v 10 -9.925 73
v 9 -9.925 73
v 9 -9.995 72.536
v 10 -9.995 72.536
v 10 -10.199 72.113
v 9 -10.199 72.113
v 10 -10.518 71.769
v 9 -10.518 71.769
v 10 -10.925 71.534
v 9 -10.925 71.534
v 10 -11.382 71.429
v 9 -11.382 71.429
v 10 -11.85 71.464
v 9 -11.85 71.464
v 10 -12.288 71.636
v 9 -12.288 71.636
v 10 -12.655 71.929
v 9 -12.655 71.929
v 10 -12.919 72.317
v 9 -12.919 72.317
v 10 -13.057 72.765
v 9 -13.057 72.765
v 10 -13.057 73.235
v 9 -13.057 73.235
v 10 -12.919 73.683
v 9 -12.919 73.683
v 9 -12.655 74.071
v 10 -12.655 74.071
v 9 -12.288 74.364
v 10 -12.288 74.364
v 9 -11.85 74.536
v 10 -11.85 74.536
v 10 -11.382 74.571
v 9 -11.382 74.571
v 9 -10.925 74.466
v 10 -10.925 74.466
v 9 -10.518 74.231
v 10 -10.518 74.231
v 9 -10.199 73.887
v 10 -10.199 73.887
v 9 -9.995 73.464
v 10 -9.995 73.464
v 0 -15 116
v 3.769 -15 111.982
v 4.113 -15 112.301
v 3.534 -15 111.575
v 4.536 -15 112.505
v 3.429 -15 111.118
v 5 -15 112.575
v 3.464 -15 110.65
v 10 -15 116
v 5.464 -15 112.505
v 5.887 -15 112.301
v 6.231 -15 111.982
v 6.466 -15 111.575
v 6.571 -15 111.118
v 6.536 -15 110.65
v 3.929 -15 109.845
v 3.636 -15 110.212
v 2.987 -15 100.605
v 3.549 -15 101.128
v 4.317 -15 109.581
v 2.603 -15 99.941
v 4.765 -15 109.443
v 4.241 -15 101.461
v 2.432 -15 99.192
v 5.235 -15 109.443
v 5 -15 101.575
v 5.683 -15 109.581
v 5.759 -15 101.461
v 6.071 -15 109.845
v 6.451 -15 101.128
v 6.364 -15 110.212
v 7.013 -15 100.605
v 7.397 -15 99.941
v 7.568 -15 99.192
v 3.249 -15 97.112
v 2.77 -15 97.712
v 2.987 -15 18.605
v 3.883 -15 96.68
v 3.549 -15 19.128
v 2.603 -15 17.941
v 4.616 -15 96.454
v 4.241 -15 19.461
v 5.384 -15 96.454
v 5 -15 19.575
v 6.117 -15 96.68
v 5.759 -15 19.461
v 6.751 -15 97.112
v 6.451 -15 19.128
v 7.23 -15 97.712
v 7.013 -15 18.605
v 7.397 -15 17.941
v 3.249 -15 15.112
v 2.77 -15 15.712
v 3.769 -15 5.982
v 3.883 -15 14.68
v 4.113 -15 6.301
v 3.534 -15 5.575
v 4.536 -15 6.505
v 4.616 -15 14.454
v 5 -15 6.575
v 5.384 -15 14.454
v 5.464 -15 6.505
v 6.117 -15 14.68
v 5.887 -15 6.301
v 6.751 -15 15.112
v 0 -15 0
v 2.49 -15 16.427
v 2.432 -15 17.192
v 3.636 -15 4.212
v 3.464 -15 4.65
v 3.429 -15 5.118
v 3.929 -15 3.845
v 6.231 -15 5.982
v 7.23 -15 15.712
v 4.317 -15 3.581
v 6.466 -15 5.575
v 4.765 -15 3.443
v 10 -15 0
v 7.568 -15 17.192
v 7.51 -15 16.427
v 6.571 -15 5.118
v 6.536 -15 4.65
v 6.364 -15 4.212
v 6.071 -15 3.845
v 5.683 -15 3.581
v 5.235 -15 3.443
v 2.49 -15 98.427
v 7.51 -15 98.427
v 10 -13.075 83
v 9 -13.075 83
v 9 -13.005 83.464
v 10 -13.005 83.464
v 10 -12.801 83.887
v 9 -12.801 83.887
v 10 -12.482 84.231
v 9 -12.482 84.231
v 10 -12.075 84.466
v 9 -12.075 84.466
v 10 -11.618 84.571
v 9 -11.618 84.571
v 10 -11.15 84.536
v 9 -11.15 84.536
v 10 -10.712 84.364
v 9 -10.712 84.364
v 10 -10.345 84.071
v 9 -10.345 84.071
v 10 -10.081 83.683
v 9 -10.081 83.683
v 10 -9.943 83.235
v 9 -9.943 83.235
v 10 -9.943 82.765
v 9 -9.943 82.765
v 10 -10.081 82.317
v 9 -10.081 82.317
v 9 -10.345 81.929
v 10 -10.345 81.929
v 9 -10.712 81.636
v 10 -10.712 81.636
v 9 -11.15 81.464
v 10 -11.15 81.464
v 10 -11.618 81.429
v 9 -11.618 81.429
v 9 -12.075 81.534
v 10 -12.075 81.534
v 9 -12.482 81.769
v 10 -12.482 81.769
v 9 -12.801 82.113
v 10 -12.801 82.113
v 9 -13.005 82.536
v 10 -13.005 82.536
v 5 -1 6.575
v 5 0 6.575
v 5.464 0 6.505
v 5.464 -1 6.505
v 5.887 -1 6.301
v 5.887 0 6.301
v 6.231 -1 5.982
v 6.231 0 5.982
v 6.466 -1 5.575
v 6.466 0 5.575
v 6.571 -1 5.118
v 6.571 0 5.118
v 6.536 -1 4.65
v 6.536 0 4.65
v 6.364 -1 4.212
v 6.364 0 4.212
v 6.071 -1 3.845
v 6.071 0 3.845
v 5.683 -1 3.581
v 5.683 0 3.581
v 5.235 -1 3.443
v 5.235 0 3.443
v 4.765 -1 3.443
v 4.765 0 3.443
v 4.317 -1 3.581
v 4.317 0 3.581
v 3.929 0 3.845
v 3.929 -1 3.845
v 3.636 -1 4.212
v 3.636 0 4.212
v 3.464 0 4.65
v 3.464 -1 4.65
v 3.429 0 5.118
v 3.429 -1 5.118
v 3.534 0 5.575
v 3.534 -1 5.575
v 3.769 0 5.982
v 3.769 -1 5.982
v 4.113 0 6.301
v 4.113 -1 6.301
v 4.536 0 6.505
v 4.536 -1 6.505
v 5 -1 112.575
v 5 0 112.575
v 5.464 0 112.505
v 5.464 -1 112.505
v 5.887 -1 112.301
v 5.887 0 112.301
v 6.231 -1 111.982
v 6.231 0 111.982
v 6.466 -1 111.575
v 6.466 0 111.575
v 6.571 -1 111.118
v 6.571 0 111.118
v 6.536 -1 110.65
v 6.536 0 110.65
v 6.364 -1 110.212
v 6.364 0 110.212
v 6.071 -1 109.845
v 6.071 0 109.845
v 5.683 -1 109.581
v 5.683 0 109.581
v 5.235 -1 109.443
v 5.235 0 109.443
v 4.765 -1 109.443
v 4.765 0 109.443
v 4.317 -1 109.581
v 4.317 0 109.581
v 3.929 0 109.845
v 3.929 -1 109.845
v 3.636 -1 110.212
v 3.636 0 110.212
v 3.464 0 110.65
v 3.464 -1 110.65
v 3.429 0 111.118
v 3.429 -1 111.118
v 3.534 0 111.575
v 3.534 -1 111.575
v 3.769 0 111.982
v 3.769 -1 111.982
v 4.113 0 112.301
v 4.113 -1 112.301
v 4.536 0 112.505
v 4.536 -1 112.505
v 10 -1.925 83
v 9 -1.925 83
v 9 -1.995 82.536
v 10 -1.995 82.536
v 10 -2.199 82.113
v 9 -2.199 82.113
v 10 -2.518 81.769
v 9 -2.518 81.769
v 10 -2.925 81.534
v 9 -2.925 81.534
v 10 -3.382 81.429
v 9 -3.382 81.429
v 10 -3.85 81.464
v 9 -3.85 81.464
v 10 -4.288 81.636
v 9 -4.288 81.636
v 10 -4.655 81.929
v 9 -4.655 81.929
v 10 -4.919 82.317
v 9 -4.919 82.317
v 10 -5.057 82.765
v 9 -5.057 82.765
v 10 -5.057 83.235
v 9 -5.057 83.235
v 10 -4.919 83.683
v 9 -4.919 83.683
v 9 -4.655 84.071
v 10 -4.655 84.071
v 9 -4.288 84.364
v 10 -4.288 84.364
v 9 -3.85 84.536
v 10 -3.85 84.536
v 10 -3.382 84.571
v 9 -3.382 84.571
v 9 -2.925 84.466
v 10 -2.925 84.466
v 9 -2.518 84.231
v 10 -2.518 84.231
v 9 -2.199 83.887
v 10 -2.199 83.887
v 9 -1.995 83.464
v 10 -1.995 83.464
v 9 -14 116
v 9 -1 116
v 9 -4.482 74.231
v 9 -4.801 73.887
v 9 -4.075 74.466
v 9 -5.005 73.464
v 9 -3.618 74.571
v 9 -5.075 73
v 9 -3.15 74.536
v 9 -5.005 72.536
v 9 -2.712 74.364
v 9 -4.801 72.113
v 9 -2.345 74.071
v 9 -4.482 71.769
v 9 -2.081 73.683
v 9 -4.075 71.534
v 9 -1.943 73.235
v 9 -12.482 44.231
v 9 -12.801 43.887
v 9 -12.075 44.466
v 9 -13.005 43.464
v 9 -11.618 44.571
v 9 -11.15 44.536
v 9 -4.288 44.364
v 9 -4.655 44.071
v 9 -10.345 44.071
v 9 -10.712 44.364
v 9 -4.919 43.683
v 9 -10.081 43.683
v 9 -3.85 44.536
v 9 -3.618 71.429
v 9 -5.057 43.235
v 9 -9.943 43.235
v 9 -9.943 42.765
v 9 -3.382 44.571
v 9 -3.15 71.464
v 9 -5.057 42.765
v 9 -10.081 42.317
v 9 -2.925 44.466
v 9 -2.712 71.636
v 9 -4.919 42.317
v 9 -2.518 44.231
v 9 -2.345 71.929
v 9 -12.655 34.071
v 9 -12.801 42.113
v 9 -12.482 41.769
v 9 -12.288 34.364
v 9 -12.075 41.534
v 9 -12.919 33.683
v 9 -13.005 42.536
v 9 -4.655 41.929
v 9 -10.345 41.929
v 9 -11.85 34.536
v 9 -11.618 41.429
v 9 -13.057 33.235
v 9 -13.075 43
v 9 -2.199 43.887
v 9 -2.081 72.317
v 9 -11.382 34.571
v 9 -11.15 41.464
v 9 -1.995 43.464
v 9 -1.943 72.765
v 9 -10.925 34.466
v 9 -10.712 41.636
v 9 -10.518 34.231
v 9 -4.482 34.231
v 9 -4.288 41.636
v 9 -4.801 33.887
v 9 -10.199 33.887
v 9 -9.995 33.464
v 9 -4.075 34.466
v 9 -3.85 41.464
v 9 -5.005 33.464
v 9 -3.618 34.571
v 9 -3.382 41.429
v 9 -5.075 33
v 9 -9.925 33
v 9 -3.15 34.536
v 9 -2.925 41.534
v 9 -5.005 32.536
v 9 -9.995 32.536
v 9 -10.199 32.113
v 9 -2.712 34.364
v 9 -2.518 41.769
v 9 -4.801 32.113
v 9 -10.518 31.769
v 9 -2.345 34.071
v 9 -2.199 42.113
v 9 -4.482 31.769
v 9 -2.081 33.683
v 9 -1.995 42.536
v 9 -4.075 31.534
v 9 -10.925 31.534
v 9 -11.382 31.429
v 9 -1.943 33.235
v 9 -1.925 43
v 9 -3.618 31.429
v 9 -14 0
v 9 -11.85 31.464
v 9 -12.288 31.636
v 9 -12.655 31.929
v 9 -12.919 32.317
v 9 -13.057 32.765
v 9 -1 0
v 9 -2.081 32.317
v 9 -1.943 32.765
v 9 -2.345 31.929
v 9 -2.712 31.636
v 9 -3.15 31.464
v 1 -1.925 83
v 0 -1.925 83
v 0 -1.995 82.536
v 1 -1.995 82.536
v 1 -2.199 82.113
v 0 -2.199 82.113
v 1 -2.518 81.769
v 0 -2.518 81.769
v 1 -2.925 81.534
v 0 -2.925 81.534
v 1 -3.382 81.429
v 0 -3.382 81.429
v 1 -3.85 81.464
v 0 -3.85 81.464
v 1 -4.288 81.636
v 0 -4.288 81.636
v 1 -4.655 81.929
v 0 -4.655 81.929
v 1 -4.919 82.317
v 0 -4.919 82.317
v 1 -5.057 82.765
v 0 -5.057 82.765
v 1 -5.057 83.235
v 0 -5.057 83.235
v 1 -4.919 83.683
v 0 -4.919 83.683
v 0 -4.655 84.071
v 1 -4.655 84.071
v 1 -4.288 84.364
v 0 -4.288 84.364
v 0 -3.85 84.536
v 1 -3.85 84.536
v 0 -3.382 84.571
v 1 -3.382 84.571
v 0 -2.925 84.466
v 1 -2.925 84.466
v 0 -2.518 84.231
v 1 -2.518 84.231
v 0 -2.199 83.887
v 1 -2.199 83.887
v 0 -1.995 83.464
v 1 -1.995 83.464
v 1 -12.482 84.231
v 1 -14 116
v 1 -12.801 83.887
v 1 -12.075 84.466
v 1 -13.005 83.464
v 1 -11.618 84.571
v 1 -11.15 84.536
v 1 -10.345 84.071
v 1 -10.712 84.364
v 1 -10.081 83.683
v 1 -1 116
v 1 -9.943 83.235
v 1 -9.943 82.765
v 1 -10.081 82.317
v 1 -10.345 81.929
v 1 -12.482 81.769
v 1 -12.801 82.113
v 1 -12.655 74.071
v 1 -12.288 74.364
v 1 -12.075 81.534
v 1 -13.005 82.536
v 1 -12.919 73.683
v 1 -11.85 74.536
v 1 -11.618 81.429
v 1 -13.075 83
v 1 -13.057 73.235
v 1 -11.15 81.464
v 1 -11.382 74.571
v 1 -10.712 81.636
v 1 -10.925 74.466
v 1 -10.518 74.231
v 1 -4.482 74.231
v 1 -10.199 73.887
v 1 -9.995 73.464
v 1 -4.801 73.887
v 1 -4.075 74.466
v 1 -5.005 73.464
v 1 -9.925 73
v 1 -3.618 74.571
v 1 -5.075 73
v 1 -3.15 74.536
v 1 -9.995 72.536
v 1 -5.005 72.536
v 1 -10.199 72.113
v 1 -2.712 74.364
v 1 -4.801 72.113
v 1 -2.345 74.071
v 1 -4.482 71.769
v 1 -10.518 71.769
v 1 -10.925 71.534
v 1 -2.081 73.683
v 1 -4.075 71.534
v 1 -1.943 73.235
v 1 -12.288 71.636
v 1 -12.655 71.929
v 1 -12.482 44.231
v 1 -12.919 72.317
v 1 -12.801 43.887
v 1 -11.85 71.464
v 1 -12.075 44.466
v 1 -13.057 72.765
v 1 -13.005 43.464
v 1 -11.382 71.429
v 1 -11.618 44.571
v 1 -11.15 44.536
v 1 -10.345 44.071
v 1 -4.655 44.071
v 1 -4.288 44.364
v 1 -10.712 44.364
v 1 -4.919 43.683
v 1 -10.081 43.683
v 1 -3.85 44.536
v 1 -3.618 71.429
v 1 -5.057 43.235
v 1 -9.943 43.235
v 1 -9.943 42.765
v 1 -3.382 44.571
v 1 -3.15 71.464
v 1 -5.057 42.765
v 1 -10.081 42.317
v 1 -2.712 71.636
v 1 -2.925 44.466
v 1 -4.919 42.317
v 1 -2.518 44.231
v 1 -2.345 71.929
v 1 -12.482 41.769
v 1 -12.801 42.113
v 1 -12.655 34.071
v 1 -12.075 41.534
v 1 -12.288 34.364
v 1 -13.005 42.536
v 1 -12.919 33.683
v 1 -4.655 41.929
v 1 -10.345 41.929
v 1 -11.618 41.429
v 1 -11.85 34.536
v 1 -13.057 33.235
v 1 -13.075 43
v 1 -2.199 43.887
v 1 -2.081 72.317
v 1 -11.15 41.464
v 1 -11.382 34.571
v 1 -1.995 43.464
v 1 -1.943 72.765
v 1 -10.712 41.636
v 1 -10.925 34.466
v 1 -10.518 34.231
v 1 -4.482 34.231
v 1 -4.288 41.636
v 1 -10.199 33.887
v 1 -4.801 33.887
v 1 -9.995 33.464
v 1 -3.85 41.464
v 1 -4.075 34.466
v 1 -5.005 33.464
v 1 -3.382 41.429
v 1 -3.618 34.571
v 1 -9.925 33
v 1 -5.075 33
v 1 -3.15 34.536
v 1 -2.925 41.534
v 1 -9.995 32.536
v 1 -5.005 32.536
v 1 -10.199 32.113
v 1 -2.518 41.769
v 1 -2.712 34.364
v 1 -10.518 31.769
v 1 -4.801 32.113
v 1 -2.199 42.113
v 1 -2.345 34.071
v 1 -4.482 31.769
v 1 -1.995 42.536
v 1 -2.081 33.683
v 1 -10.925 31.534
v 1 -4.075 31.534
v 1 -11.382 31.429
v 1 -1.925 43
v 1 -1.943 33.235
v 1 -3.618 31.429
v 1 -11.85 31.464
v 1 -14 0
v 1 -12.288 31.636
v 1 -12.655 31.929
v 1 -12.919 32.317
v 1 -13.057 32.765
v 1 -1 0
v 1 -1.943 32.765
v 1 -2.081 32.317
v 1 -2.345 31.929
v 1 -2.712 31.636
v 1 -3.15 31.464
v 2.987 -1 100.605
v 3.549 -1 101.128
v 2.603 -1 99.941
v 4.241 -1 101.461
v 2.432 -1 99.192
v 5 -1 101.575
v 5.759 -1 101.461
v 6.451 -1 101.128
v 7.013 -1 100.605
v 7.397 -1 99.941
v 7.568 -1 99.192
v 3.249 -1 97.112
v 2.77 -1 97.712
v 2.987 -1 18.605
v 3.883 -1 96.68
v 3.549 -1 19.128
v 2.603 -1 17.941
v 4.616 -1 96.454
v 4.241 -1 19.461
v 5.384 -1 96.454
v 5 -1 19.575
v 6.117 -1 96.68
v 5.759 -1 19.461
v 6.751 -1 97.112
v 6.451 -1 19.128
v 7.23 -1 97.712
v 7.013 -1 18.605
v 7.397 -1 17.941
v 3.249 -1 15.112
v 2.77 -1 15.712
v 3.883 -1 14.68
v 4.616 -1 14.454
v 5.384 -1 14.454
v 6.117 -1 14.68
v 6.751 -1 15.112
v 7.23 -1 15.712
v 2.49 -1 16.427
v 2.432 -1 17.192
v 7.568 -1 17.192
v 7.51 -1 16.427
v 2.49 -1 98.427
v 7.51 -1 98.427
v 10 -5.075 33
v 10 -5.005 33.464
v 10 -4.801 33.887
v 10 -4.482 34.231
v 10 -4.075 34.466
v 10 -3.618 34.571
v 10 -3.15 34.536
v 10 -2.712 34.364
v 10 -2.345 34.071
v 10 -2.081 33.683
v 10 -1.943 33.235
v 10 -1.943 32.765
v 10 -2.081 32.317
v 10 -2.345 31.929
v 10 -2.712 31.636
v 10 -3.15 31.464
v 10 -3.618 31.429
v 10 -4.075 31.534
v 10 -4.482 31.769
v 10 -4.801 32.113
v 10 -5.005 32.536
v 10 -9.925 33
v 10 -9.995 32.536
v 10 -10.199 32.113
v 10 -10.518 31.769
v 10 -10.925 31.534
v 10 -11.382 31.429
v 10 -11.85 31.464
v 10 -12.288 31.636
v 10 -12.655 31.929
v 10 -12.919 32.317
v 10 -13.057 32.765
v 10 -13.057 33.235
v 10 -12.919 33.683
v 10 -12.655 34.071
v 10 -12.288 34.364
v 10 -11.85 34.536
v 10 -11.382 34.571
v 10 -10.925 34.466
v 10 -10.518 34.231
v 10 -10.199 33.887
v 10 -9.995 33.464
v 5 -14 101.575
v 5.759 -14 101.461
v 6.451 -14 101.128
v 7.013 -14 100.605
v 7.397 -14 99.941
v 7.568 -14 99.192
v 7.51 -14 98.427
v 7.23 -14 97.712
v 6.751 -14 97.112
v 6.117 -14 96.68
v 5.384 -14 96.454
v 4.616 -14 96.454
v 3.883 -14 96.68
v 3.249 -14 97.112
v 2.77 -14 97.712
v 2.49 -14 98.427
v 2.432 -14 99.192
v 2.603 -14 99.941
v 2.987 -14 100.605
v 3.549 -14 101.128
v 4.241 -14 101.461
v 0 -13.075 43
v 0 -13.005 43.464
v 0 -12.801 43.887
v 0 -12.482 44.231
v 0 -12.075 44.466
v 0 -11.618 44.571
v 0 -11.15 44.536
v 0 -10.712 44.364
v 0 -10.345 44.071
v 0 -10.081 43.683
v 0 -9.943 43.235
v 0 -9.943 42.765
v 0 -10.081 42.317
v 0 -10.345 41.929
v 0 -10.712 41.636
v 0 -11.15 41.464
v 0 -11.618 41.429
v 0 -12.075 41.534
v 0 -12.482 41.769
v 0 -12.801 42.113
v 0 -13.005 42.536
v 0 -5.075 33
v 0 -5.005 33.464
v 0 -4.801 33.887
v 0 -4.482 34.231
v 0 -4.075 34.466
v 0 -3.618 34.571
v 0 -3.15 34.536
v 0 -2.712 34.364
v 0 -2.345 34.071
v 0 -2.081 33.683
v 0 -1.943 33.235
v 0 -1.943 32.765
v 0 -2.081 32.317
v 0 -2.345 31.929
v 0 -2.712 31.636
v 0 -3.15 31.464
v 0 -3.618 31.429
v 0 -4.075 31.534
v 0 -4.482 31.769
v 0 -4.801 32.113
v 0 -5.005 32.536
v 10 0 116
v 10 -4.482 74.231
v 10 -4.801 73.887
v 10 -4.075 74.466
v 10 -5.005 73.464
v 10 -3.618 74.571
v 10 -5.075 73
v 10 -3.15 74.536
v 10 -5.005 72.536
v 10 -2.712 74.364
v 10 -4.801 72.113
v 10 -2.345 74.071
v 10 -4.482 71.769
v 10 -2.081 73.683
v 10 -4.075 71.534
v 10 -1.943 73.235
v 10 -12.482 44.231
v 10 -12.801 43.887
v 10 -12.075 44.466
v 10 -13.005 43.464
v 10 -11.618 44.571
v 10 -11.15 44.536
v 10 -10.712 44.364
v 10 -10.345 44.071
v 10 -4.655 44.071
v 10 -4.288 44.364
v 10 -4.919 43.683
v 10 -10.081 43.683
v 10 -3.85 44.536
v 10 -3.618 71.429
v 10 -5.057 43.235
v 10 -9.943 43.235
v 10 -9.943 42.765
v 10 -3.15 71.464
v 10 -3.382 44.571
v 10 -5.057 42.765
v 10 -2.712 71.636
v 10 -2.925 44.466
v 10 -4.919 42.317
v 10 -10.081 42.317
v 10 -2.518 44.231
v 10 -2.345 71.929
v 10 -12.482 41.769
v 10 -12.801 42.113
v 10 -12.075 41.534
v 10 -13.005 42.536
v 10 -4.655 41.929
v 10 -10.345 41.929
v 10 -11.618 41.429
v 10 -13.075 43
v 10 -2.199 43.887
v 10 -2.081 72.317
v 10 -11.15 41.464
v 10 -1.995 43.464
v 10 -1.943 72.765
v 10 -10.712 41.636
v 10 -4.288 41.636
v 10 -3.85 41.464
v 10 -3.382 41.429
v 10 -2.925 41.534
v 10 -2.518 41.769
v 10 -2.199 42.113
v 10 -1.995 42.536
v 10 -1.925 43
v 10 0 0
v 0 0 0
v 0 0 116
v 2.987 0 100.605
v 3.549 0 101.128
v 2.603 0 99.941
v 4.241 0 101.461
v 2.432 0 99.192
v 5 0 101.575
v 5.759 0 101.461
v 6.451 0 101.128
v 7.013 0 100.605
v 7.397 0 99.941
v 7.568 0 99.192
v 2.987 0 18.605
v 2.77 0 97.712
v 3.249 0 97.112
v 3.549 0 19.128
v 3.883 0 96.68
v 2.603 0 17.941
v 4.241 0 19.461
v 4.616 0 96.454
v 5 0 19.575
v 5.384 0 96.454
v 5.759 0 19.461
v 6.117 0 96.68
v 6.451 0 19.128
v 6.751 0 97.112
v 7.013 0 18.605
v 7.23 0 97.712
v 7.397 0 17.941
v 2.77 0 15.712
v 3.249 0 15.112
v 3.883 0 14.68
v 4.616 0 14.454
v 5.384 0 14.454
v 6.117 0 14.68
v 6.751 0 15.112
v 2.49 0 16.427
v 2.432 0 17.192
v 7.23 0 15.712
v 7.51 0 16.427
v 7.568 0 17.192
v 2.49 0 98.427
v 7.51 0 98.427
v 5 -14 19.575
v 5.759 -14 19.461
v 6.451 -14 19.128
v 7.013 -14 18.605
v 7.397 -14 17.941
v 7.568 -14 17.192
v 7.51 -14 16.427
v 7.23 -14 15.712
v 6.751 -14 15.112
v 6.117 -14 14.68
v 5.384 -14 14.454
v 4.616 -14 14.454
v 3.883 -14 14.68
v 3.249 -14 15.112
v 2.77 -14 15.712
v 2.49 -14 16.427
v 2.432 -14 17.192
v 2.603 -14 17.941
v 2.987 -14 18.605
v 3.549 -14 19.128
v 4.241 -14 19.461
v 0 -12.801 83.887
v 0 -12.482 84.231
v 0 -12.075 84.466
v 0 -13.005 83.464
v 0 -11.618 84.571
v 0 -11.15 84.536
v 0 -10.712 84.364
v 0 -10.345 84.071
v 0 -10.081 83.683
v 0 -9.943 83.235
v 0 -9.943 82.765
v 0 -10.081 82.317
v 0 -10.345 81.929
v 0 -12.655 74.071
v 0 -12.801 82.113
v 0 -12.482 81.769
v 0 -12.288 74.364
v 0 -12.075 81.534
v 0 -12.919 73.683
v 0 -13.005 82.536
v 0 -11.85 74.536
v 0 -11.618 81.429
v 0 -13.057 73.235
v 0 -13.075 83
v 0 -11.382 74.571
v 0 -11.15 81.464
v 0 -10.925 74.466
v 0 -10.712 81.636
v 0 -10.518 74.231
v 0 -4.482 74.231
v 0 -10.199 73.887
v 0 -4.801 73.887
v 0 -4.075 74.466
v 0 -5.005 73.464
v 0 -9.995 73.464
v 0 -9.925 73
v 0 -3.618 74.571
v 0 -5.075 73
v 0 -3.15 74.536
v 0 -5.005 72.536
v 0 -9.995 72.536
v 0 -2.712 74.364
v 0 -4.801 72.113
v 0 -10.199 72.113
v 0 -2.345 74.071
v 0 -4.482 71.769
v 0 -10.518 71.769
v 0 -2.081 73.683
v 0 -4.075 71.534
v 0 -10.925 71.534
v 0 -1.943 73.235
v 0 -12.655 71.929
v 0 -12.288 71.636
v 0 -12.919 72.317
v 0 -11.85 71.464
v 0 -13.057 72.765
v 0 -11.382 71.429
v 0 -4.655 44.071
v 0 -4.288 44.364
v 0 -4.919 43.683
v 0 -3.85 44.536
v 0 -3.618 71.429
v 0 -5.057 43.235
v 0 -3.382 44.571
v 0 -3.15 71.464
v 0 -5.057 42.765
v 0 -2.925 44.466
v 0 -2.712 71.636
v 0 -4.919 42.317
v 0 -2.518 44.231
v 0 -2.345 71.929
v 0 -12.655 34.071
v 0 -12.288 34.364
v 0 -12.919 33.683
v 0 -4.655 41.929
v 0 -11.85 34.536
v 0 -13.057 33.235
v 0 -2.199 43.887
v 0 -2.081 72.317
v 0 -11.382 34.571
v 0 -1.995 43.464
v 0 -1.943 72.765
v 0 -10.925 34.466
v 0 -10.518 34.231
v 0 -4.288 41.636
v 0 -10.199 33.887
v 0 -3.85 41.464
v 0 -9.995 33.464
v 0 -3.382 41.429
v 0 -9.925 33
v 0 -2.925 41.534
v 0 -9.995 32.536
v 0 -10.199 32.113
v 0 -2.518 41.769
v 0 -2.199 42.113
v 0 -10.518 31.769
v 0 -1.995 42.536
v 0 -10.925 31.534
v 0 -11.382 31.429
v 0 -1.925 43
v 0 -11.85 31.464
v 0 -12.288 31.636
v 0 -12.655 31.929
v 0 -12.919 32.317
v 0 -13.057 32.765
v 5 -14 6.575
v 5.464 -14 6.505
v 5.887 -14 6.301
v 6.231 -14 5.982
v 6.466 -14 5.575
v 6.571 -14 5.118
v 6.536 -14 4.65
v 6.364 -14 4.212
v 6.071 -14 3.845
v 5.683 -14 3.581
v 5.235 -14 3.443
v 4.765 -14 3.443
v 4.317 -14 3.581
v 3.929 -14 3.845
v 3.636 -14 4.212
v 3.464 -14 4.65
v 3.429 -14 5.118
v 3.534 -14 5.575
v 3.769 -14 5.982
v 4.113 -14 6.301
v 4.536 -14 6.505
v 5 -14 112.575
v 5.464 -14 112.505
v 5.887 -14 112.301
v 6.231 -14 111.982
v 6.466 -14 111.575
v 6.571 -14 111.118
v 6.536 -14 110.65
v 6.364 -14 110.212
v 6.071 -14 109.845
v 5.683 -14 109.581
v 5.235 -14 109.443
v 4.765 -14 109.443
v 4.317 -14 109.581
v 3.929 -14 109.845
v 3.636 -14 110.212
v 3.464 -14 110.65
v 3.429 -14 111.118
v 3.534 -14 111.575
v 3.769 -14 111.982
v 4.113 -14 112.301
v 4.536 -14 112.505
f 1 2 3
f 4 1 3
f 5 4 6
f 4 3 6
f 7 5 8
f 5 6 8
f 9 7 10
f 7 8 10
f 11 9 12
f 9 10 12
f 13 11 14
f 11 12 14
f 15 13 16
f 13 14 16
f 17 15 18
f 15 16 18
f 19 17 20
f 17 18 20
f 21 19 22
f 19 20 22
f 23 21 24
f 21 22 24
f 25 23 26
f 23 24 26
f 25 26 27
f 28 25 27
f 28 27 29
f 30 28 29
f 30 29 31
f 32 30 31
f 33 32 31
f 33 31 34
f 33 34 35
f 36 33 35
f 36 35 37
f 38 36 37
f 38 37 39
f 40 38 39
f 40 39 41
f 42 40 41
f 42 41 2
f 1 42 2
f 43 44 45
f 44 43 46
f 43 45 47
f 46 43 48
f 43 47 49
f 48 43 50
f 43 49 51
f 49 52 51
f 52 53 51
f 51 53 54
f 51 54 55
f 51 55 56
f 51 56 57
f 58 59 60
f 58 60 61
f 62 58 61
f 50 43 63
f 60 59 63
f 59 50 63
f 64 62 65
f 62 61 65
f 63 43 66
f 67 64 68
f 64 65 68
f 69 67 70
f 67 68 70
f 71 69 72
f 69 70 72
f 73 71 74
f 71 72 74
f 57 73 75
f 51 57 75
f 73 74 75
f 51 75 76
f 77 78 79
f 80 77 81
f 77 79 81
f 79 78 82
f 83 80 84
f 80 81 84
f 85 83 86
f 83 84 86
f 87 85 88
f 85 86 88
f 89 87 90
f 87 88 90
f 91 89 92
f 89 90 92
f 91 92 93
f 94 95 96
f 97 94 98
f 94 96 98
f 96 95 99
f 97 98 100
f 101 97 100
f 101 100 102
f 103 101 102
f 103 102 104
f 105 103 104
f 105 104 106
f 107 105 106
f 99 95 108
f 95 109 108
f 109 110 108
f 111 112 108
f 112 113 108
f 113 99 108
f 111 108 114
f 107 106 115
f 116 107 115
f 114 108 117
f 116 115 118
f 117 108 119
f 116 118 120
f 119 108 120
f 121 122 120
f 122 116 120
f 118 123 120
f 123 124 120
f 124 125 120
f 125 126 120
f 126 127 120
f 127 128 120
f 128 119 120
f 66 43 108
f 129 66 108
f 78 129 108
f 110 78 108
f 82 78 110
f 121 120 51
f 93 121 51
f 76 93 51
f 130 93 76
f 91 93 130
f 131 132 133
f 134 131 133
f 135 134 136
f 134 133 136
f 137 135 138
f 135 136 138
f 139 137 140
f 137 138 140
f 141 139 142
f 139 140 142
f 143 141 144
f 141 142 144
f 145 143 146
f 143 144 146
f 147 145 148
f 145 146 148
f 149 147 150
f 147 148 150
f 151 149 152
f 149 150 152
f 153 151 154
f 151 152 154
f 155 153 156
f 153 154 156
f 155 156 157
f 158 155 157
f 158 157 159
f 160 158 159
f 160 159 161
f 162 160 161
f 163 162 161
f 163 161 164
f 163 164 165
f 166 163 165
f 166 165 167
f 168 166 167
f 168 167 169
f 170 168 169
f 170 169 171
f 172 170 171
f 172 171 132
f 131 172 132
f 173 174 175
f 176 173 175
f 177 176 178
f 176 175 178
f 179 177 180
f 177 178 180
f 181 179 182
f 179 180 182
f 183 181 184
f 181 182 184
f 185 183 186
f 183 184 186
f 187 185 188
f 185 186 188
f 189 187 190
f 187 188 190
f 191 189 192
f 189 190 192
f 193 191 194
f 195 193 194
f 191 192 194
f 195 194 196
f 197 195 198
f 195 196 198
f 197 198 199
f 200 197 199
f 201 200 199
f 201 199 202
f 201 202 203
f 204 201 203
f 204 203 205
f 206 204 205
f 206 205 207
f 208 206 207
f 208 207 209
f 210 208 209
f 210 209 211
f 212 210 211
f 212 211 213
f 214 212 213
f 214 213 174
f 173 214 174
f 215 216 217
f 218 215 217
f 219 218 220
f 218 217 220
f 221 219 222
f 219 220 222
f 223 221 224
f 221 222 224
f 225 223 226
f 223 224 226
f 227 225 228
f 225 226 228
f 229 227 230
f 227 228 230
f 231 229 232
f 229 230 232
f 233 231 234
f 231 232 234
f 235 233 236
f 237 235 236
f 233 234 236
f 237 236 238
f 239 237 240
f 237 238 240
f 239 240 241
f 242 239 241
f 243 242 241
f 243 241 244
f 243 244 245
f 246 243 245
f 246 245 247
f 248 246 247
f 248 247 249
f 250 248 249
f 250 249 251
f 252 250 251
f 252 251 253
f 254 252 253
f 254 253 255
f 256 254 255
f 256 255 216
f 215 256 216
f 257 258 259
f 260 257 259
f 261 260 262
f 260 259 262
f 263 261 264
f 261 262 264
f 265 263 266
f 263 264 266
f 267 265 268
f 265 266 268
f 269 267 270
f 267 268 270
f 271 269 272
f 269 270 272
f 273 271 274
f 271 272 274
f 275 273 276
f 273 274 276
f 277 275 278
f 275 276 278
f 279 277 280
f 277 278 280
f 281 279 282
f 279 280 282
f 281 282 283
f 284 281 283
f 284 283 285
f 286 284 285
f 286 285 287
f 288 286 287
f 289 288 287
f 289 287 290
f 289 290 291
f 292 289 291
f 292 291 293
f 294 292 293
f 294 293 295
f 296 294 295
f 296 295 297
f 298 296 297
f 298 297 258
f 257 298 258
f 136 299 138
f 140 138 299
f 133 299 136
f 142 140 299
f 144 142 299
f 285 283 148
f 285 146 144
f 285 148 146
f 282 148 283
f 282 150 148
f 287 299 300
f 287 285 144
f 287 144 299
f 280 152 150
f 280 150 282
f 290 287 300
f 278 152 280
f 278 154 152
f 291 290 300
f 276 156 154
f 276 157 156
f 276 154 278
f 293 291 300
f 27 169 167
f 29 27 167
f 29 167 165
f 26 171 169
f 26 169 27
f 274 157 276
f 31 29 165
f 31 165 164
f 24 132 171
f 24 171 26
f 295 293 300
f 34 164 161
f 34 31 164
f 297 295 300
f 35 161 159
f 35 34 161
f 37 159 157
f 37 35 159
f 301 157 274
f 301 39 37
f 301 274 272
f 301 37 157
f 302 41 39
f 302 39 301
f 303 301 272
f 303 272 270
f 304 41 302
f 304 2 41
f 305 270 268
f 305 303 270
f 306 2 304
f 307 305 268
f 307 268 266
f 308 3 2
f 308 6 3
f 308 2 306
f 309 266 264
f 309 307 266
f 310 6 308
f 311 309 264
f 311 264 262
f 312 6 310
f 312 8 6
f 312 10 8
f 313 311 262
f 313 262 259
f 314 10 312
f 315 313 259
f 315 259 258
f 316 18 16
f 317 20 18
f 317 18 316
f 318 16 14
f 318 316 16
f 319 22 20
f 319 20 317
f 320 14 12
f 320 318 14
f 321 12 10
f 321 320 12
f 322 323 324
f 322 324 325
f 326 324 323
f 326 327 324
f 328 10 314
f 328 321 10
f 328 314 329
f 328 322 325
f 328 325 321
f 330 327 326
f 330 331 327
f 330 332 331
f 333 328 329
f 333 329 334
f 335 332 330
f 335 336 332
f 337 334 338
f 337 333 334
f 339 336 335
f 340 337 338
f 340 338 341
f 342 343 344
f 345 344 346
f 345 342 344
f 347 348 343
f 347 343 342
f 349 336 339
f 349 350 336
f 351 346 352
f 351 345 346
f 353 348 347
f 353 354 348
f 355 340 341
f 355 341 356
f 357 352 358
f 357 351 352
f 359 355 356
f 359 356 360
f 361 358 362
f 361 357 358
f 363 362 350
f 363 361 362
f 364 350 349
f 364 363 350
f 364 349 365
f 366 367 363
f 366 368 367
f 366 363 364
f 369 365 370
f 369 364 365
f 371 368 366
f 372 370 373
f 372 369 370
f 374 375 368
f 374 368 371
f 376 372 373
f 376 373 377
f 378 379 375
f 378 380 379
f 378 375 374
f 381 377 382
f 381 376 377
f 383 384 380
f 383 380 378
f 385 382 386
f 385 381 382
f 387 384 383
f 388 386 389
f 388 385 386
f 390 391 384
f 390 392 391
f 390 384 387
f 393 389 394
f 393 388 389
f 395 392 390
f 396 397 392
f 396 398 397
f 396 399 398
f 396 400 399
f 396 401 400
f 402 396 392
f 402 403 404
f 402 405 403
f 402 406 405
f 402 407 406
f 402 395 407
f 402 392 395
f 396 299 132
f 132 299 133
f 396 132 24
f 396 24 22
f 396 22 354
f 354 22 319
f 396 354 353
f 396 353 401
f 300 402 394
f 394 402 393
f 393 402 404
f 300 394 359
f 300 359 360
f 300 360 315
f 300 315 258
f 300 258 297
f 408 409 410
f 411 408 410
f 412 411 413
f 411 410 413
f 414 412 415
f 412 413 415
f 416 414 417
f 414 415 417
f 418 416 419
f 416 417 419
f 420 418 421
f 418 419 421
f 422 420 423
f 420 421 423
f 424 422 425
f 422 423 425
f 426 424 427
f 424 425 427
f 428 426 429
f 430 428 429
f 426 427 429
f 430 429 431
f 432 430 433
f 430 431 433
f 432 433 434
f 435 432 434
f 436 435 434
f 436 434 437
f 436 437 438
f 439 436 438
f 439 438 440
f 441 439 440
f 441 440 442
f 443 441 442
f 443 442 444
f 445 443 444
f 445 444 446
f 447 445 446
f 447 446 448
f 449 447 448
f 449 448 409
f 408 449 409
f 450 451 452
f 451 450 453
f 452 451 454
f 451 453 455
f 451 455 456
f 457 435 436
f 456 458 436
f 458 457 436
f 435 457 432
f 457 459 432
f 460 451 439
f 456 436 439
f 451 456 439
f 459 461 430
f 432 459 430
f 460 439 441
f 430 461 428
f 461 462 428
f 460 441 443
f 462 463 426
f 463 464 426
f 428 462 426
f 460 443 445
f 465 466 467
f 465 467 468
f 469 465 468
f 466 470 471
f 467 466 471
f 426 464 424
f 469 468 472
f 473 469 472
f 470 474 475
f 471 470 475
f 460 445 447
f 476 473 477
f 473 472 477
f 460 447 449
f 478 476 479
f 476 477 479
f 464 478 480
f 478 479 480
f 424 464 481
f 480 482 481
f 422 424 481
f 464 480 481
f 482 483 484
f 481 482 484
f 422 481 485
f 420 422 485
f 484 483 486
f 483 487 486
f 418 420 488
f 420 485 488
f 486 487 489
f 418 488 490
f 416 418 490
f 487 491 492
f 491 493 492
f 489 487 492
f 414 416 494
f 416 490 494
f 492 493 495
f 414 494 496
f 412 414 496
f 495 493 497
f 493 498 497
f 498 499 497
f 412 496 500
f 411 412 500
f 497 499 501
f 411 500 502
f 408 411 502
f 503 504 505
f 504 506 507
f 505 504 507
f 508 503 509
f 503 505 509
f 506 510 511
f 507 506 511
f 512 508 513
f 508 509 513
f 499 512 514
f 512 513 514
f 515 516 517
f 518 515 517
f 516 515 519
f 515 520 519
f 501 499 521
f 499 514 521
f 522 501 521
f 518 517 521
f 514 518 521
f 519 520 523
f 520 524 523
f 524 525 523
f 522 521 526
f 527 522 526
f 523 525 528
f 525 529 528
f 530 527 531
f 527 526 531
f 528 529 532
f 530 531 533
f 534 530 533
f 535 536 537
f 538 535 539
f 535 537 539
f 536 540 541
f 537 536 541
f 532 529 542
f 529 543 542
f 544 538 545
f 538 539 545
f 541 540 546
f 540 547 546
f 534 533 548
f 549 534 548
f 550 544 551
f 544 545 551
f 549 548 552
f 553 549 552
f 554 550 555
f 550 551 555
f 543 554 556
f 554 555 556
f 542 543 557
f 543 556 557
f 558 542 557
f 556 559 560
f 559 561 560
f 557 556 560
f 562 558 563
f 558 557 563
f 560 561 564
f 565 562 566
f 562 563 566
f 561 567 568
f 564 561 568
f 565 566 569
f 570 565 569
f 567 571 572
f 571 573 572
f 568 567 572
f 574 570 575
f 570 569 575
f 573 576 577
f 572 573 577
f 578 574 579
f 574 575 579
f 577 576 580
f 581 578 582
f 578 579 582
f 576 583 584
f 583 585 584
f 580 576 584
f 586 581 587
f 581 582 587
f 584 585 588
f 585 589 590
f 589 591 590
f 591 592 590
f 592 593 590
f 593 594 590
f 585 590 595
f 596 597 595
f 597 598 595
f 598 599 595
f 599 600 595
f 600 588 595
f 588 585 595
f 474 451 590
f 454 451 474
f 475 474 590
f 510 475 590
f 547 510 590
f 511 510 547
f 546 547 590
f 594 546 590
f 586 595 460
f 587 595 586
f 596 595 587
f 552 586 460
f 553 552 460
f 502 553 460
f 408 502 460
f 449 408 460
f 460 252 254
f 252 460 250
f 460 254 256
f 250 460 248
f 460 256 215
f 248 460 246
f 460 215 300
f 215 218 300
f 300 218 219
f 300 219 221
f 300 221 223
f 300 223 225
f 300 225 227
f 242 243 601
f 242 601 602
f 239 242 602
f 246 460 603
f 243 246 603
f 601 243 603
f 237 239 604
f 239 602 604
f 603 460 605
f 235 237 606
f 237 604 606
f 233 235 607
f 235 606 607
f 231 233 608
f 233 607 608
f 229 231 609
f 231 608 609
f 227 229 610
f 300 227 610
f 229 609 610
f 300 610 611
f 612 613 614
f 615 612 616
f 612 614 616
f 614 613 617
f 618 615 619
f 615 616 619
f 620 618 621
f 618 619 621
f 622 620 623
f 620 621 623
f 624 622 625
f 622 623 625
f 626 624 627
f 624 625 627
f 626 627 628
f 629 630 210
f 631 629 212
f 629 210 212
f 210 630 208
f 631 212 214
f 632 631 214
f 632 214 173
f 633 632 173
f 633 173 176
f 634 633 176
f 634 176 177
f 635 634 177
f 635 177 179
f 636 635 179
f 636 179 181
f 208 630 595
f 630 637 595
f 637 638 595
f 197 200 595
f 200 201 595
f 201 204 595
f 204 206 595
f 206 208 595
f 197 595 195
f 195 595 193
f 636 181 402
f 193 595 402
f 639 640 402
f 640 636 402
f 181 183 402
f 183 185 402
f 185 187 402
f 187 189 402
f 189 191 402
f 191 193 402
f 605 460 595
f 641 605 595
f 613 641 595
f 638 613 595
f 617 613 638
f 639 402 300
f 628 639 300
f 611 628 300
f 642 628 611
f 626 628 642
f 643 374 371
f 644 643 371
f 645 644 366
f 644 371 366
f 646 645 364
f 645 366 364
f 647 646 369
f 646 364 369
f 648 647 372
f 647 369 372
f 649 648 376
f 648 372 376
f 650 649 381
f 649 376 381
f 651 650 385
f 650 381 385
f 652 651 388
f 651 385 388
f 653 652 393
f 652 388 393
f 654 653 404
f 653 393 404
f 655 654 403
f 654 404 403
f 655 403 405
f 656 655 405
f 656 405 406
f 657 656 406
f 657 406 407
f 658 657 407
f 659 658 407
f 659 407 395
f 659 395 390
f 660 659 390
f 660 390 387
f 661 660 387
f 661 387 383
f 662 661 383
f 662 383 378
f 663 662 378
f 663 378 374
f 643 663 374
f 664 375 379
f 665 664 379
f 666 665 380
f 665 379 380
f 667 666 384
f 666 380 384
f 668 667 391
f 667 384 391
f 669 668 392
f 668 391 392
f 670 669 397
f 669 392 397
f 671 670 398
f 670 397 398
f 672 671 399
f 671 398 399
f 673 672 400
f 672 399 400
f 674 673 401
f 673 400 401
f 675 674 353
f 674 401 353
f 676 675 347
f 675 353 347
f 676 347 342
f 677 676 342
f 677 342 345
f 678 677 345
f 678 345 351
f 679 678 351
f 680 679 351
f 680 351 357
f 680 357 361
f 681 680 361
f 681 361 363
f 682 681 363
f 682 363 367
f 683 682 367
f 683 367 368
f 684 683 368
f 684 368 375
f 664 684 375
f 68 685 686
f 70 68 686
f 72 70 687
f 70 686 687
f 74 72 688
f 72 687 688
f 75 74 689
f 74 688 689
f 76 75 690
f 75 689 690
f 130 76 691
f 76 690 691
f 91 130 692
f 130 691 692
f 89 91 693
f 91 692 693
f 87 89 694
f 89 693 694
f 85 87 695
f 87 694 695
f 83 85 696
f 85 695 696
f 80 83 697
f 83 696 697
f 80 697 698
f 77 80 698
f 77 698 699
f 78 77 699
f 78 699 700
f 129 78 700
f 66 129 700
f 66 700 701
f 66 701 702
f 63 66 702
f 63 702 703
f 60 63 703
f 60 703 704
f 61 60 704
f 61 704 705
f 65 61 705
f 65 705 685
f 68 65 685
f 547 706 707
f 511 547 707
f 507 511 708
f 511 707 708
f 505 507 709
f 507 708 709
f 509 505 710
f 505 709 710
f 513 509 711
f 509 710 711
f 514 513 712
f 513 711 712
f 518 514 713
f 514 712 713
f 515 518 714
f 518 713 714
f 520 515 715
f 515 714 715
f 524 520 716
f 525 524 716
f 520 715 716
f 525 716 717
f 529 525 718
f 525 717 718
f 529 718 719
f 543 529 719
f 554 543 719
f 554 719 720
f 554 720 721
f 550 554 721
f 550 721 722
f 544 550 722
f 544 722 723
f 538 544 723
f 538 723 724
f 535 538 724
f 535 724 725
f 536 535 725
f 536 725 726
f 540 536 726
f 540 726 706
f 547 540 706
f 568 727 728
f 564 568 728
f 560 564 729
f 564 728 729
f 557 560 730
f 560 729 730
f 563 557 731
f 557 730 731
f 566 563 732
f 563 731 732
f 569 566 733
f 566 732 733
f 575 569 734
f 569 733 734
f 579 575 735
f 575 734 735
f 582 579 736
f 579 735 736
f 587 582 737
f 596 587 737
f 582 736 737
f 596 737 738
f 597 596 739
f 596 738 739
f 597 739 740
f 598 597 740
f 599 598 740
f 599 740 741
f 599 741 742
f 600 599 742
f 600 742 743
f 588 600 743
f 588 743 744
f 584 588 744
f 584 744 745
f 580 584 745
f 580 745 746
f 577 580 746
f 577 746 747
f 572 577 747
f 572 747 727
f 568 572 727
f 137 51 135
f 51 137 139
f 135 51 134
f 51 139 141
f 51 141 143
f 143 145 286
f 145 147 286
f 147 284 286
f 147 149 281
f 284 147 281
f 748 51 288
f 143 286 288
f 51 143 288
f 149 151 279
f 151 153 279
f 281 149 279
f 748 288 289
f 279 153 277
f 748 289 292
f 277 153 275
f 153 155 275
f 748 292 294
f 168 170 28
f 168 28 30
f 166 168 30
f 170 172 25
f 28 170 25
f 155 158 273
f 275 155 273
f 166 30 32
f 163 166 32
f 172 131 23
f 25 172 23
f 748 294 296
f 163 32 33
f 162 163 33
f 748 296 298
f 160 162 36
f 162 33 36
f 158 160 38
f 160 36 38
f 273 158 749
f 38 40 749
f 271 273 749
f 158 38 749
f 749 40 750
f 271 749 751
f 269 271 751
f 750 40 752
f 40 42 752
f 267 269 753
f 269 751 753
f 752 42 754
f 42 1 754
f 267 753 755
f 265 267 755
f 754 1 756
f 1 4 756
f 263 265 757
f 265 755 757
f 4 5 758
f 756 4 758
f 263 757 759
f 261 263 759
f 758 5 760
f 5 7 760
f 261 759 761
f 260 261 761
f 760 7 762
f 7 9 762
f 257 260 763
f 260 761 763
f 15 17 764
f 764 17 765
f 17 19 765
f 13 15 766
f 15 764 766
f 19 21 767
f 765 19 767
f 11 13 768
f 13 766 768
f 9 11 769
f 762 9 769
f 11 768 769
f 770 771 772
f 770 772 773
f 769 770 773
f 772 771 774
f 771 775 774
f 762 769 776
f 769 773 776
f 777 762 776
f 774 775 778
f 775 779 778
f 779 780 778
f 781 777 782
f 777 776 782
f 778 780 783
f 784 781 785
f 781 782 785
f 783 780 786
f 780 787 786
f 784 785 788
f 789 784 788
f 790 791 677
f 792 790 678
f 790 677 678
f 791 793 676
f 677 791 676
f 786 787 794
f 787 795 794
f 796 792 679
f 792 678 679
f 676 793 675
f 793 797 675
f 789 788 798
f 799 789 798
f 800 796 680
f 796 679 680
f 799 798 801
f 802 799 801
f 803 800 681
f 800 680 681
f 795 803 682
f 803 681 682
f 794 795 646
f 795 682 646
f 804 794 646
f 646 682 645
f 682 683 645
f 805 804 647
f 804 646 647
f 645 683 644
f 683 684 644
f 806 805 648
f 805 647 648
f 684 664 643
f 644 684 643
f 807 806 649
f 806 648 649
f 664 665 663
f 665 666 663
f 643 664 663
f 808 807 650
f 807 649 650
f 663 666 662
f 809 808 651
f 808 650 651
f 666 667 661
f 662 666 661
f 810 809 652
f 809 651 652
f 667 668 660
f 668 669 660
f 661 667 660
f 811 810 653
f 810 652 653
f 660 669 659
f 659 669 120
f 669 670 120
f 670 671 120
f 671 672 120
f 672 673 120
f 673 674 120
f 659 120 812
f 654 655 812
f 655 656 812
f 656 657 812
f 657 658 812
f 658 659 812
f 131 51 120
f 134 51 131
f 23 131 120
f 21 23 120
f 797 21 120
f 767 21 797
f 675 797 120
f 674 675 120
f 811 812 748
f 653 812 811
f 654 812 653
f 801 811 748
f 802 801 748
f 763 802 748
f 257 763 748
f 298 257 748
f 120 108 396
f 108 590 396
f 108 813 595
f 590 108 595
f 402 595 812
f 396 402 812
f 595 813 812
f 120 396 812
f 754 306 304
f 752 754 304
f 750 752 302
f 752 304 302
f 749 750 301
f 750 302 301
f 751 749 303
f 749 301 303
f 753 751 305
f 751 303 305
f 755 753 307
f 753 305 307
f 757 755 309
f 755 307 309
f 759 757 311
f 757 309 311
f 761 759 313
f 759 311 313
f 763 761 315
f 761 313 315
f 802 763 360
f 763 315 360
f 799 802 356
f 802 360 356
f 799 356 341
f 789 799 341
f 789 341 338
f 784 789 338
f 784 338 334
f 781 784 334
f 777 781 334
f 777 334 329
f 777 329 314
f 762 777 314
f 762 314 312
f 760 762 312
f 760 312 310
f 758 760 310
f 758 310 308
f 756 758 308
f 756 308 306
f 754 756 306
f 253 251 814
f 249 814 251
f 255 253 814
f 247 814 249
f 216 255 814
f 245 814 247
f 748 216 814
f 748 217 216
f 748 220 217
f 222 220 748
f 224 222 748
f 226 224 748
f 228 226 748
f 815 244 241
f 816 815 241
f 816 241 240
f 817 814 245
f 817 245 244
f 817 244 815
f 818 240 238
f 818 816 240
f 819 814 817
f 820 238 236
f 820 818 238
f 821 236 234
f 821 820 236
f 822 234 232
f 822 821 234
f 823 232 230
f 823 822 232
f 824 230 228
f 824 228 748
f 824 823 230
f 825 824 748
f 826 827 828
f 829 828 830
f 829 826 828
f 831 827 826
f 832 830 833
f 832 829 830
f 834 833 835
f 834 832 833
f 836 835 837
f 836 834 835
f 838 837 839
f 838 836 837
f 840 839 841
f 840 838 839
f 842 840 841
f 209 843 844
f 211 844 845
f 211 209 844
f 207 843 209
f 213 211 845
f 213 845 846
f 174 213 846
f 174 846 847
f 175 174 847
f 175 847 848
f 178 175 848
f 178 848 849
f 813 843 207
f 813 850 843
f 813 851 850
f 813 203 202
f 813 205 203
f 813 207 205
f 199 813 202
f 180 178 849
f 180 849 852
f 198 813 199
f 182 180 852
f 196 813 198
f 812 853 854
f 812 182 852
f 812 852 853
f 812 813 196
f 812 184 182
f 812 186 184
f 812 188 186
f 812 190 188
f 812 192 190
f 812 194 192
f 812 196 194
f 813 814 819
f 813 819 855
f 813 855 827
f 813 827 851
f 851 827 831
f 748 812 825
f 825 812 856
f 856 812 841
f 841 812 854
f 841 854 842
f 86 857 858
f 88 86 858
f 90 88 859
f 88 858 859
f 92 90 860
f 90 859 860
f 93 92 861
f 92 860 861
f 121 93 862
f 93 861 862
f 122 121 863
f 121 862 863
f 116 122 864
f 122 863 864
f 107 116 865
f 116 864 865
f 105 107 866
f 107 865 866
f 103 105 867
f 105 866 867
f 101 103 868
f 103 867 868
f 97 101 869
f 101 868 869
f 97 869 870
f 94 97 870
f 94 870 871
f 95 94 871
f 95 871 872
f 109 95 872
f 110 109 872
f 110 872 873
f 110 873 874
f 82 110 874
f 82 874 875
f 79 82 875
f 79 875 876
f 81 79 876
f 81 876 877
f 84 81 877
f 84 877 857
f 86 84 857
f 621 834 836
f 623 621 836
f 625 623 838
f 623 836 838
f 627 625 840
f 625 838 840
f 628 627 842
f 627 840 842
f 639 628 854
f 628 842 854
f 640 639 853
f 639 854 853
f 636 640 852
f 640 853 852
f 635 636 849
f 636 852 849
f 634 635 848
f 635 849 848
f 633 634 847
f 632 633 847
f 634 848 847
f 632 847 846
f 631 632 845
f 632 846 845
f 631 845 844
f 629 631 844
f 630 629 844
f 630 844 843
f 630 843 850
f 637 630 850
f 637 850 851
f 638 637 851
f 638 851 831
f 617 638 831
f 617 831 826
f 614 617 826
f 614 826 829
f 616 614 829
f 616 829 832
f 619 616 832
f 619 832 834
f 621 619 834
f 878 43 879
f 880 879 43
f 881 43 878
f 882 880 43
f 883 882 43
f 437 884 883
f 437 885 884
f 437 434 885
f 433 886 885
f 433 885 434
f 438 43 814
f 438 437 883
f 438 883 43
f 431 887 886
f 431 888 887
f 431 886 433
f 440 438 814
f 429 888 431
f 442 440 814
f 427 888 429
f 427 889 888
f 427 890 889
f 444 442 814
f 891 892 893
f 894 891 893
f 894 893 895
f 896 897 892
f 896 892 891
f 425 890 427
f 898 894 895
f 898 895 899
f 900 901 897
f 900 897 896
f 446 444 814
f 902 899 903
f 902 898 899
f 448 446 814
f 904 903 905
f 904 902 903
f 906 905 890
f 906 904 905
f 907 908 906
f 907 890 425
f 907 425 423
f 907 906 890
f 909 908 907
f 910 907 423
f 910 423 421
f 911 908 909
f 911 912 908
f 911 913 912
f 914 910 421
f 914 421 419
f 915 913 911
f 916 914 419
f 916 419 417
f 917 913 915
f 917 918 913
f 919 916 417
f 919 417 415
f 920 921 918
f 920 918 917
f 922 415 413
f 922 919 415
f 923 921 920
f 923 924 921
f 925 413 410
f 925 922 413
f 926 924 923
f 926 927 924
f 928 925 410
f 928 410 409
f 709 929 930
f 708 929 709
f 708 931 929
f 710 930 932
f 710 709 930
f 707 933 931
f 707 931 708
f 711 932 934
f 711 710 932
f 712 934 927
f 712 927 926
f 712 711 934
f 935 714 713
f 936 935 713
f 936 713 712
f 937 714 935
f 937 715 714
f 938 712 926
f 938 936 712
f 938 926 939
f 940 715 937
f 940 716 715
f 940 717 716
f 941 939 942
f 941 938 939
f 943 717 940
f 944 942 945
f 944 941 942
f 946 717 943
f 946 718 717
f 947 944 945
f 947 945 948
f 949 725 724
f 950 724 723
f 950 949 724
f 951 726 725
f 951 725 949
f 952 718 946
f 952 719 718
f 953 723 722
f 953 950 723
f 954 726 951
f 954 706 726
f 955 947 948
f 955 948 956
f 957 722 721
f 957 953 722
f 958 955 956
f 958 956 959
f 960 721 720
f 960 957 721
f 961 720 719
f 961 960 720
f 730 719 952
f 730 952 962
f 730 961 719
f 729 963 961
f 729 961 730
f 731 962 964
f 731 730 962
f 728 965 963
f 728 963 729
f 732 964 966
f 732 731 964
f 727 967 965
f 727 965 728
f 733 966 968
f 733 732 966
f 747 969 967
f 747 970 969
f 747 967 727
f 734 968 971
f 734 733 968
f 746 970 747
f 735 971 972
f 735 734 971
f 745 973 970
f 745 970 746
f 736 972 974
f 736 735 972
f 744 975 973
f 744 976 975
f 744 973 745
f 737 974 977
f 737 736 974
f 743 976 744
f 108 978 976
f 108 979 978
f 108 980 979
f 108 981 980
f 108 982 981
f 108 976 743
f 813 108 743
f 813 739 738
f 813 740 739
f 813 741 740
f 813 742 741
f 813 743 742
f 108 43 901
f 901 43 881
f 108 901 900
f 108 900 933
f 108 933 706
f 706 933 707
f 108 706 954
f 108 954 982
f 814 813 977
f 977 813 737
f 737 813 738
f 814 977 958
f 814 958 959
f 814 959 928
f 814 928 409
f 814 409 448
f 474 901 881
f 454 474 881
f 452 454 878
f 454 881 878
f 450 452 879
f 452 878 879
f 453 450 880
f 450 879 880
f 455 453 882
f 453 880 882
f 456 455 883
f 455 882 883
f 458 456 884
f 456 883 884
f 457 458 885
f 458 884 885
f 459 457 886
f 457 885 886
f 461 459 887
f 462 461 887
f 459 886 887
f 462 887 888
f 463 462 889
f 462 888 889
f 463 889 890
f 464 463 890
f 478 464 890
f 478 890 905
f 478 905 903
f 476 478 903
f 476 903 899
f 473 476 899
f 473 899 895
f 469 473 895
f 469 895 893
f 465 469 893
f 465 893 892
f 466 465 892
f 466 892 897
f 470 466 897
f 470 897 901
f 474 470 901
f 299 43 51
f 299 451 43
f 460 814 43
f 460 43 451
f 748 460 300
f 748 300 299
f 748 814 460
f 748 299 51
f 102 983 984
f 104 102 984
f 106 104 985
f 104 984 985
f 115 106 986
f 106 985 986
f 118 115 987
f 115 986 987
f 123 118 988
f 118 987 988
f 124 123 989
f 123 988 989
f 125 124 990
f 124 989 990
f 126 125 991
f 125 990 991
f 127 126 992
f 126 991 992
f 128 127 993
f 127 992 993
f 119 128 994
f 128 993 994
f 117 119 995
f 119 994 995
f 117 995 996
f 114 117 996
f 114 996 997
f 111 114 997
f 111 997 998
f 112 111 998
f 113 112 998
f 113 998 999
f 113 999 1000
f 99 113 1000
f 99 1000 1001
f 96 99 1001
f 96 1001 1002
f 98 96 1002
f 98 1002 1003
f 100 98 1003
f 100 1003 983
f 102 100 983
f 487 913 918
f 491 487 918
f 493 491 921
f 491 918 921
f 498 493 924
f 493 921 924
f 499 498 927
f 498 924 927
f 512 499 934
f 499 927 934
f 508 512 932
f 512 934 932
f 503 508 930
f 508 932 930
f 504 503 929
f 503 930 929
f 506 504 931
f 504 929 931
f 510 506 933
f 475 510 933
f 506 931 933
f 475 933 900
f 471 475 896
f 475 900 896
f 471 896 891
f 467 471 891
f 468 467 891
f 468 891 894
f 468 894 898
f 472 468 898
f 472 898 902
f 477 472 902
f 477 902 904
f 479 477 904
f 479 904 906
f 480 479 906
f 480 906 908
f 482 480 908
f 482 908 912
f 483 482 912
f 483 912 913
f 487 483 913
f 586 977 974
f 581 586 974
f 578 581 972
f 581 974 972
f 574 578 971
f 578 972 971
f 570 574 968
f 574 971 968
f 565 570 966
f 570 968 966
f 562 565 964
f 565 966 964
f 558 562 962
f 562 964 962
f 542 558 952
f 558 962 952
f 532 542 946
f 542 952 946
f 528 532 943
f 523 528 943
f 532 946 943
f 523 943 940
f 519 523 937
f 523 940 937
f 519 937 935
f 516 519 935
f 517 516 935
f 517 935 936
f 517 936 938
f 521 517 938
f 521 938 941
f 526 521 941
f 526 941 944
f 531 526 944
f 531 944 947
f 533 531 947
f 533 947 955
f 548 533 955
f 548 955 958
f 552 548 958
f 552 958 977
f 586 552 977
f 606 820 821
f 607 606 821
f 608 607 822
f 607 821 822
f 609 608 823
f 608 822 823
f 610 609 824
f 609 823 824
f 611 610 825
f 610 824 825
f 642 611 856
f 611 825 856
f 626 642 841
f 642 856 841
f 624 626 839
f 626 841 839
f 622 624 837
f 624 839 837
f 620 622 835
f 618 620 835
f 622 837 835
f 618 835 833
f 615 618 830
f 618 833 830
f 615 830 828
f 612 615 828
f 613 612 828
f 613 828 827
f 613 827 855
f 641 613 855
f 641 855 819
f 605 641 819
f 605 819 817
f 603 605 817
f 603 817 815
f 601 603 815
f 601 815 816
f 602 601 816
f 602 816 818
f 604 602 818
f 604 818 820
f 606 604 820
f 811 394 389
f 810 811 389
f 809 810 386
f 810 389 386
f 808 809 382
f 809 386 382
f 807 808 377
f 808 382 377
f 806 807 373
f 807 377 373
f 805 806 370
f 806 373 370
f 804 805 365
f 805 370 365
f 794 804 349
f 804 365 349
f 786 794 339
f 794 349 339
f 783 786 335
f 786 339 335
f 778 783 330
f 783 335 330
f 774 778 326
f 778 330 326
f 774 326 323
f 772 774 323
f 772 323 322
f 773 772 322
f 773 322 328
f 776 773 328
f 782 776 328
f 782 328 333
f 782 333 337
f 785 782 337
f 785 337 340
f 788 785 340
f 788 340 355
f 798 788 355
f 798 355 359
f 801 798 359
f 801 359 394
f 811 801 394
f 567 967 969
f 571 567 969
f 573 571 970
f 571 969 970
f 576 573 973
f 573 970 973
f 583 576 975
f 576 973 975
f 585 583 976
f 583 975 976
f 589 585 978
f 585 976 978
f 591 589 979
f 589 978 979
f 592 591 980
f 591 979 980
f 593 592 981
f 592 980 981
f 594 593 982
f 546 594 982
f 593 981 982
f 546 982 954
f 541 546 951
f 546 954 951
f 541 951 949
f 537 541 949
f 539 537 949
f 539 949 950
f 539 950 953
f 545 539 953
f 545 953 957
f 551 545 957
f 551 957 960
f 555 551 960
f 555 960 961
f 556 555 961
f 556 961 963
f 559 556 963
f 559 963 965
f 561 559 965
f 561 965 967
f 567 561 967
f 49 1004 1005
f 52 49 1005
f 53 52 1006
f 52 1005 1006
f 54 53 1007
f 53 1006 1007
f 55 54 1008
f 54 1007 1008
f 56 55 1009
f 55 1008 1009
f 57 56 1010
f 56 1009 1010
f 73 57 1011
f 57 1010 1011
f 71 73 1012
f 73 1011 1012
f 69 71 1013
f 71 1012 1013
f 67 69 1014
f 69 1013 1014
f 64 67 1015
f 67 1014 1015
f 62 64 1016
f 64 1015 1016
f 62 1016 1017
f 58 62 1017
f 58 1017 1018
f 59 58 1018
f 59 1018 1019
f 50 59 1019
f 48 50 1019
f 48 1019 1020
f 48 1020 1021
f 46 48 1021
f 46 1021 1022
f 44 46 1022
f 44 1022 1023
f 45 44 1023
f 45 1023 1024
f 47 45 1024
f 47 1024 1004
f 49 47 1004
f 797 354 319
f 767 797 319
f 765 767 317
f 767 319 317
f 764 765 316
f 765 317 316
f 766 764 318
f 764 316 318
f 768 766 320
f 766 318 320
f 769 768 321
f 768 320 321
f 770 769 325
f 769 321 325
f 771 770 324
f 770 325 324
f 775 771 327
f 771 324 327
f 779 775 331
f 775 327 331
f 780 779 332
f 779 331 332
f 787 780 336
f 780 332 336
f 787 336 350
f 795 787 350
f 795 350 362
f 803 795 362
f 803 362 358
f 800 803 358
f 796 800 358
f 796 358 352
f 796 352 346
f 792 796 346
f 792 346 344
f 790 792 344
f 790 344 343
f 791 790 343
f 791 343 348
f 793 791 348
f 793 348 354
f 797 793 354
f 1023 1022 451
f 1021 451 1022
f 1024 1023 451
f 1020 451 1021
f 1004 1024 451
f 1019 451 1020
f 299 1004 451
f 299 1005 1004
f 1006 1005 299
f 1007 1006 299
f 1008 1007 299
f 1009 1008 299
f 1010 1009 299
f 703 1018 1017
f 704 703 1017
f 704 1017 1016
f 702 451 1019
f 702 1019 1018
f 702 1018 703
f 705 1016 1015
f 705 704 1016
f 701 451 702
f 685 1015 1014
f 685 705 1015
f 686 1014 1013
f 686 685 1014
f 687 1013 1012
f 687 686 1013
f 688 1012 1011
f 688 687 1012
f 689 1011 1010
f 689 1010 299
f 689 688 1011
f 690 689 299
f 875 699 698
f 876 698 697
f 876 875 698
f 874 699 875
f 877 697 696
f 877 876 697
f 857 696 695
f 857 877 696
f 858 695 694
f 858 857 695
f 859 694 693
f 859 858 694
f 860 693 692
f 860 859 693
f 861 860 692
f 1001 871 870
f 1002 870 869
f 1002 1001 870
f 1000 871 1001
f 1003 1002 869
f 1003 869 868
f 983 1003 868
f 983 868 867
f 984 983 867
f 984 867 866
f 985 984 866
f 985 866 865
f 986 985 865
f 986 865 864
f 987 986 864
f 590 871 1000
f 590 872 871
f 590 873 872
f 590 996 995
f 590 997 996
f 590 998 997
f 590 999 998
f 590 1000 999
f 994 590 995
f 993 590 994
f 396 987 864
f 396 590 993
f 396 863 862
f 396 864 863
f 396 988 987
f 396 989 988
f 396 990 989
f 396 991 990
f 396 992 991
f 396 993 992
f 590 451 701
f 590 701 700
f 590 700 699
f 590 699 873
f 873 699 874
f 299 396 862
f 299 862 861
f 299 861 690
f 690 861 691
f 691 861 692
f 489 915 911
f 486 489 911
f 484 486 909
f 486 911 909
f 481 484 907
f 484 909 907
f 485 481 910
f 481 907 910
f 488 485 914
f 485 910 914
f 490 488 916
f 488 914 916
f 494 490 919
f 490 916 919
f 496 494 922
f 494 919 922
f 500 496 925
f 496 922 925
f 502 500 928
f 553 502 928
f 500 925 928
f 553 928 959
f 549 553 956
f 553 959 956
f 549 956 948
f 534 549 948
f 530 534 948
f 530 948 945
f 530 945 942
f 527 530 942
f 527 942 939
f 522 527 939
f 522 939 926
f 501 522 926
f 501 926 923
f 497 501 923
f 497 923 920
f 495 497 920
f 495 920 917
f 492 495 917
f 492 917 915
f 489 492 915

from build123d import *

# Parameters (mm, degrees)
SKETCH_1_W          = 10
SKETCH_1_H          = 15
SKETCH_1_W_2        = 8
SKETCH_1_H_2        = 13
EXTRUDE_1_DEPTH     = 116
SKETCH_2_R          = 1.575
SKETCH_2_R_2        = 2.575
CUT_EXTRUDE_1_DEPTH = 118.39250402
SKETCH_3_R          = 1.575
CUT_EXTRUDE_2_DEPTH = 118.39250402


with BuildPart() as part:
    # 草图1 → 拉伸-薄壁1 (new body)
    with BuildSketch(Plane.XY):
        with Locations((5, -7.5)):
            Rectangle(SKETCH_1_W, SKETCH_1_H)
        with Locations((5, -7.5)):
            Rectangle(SKETCH_1_W_2, SKETCH_1_H_2, mode=Mode.SUBTRACT)
    extrude(amount=EXTRUDE_1_DEPTH)

    # 草图2 → 切除-拉伸1 (cut, through all)
    with BuildSketch(Plane(origin=(0, 0, 0), x_dir=(1, 0, 0), z_dir=(0, 1, 0))):
        with Locations(Location((5, -5, 0), (0, 0, 270))):
            Circle(SKETCH_2_R)
        with Locations(Location((5, -17, 0), (0, 0, 270))):
            Circle(SKETCH_2_R_2)
        with Locations(Location((5, -99, 0), (0, 0, 270))):
            Circle(SKETCH_2_R_2)
        with Locations(Location((5, -111, 0), (0, 0, 270))):
            Circle(SKETCH_2_R)
    extrude(amount=-CUT_EXTRUDE_1_DEPTH, mode=Mode.SUBTRACT)

    # 草图3 → 切除-拉伸2 (cut, through all)
    with BuildSketch(Plane.ZY):
        with Locations(Location((33, -3.5, 0), (0, 0, 270))):
            Circle(SKETCH_3_R)
        with Locations(Location((43, -3.5, 0), (0, 0, 90))):
            Circle(SKETCH_3_R)
        with Locations(Location((43, -11.5, 0), (0, 0, 270))):
            Circle(SKETCH_3_R)
        with Locations(Location((33, -11.5, 0), (0, 0, 90))):
            Circle(SKETCH_3_R)
        with Locations(Location((83, -11.5, 0), (0, 0, 270))):
            Circle(SKETCH_3_R)
        with Locations(Location((73, -11.5, 0), (0, 0, 90))):
            Circle(SKETCH_3_R)
        with Locations(Location((73, -3.5, 0), (0, 0, 270))):
            Circle(SKETCH_3_R)
        with Locations(Location((83, -3.5, 0), (0, 0, 90))):
            Circle(SKETCH_3_R)
    extrude(amount=-CUT_EXTRUDE_2_DEPTH, mode=Mode.SUBTRACT)


solid = part.part
